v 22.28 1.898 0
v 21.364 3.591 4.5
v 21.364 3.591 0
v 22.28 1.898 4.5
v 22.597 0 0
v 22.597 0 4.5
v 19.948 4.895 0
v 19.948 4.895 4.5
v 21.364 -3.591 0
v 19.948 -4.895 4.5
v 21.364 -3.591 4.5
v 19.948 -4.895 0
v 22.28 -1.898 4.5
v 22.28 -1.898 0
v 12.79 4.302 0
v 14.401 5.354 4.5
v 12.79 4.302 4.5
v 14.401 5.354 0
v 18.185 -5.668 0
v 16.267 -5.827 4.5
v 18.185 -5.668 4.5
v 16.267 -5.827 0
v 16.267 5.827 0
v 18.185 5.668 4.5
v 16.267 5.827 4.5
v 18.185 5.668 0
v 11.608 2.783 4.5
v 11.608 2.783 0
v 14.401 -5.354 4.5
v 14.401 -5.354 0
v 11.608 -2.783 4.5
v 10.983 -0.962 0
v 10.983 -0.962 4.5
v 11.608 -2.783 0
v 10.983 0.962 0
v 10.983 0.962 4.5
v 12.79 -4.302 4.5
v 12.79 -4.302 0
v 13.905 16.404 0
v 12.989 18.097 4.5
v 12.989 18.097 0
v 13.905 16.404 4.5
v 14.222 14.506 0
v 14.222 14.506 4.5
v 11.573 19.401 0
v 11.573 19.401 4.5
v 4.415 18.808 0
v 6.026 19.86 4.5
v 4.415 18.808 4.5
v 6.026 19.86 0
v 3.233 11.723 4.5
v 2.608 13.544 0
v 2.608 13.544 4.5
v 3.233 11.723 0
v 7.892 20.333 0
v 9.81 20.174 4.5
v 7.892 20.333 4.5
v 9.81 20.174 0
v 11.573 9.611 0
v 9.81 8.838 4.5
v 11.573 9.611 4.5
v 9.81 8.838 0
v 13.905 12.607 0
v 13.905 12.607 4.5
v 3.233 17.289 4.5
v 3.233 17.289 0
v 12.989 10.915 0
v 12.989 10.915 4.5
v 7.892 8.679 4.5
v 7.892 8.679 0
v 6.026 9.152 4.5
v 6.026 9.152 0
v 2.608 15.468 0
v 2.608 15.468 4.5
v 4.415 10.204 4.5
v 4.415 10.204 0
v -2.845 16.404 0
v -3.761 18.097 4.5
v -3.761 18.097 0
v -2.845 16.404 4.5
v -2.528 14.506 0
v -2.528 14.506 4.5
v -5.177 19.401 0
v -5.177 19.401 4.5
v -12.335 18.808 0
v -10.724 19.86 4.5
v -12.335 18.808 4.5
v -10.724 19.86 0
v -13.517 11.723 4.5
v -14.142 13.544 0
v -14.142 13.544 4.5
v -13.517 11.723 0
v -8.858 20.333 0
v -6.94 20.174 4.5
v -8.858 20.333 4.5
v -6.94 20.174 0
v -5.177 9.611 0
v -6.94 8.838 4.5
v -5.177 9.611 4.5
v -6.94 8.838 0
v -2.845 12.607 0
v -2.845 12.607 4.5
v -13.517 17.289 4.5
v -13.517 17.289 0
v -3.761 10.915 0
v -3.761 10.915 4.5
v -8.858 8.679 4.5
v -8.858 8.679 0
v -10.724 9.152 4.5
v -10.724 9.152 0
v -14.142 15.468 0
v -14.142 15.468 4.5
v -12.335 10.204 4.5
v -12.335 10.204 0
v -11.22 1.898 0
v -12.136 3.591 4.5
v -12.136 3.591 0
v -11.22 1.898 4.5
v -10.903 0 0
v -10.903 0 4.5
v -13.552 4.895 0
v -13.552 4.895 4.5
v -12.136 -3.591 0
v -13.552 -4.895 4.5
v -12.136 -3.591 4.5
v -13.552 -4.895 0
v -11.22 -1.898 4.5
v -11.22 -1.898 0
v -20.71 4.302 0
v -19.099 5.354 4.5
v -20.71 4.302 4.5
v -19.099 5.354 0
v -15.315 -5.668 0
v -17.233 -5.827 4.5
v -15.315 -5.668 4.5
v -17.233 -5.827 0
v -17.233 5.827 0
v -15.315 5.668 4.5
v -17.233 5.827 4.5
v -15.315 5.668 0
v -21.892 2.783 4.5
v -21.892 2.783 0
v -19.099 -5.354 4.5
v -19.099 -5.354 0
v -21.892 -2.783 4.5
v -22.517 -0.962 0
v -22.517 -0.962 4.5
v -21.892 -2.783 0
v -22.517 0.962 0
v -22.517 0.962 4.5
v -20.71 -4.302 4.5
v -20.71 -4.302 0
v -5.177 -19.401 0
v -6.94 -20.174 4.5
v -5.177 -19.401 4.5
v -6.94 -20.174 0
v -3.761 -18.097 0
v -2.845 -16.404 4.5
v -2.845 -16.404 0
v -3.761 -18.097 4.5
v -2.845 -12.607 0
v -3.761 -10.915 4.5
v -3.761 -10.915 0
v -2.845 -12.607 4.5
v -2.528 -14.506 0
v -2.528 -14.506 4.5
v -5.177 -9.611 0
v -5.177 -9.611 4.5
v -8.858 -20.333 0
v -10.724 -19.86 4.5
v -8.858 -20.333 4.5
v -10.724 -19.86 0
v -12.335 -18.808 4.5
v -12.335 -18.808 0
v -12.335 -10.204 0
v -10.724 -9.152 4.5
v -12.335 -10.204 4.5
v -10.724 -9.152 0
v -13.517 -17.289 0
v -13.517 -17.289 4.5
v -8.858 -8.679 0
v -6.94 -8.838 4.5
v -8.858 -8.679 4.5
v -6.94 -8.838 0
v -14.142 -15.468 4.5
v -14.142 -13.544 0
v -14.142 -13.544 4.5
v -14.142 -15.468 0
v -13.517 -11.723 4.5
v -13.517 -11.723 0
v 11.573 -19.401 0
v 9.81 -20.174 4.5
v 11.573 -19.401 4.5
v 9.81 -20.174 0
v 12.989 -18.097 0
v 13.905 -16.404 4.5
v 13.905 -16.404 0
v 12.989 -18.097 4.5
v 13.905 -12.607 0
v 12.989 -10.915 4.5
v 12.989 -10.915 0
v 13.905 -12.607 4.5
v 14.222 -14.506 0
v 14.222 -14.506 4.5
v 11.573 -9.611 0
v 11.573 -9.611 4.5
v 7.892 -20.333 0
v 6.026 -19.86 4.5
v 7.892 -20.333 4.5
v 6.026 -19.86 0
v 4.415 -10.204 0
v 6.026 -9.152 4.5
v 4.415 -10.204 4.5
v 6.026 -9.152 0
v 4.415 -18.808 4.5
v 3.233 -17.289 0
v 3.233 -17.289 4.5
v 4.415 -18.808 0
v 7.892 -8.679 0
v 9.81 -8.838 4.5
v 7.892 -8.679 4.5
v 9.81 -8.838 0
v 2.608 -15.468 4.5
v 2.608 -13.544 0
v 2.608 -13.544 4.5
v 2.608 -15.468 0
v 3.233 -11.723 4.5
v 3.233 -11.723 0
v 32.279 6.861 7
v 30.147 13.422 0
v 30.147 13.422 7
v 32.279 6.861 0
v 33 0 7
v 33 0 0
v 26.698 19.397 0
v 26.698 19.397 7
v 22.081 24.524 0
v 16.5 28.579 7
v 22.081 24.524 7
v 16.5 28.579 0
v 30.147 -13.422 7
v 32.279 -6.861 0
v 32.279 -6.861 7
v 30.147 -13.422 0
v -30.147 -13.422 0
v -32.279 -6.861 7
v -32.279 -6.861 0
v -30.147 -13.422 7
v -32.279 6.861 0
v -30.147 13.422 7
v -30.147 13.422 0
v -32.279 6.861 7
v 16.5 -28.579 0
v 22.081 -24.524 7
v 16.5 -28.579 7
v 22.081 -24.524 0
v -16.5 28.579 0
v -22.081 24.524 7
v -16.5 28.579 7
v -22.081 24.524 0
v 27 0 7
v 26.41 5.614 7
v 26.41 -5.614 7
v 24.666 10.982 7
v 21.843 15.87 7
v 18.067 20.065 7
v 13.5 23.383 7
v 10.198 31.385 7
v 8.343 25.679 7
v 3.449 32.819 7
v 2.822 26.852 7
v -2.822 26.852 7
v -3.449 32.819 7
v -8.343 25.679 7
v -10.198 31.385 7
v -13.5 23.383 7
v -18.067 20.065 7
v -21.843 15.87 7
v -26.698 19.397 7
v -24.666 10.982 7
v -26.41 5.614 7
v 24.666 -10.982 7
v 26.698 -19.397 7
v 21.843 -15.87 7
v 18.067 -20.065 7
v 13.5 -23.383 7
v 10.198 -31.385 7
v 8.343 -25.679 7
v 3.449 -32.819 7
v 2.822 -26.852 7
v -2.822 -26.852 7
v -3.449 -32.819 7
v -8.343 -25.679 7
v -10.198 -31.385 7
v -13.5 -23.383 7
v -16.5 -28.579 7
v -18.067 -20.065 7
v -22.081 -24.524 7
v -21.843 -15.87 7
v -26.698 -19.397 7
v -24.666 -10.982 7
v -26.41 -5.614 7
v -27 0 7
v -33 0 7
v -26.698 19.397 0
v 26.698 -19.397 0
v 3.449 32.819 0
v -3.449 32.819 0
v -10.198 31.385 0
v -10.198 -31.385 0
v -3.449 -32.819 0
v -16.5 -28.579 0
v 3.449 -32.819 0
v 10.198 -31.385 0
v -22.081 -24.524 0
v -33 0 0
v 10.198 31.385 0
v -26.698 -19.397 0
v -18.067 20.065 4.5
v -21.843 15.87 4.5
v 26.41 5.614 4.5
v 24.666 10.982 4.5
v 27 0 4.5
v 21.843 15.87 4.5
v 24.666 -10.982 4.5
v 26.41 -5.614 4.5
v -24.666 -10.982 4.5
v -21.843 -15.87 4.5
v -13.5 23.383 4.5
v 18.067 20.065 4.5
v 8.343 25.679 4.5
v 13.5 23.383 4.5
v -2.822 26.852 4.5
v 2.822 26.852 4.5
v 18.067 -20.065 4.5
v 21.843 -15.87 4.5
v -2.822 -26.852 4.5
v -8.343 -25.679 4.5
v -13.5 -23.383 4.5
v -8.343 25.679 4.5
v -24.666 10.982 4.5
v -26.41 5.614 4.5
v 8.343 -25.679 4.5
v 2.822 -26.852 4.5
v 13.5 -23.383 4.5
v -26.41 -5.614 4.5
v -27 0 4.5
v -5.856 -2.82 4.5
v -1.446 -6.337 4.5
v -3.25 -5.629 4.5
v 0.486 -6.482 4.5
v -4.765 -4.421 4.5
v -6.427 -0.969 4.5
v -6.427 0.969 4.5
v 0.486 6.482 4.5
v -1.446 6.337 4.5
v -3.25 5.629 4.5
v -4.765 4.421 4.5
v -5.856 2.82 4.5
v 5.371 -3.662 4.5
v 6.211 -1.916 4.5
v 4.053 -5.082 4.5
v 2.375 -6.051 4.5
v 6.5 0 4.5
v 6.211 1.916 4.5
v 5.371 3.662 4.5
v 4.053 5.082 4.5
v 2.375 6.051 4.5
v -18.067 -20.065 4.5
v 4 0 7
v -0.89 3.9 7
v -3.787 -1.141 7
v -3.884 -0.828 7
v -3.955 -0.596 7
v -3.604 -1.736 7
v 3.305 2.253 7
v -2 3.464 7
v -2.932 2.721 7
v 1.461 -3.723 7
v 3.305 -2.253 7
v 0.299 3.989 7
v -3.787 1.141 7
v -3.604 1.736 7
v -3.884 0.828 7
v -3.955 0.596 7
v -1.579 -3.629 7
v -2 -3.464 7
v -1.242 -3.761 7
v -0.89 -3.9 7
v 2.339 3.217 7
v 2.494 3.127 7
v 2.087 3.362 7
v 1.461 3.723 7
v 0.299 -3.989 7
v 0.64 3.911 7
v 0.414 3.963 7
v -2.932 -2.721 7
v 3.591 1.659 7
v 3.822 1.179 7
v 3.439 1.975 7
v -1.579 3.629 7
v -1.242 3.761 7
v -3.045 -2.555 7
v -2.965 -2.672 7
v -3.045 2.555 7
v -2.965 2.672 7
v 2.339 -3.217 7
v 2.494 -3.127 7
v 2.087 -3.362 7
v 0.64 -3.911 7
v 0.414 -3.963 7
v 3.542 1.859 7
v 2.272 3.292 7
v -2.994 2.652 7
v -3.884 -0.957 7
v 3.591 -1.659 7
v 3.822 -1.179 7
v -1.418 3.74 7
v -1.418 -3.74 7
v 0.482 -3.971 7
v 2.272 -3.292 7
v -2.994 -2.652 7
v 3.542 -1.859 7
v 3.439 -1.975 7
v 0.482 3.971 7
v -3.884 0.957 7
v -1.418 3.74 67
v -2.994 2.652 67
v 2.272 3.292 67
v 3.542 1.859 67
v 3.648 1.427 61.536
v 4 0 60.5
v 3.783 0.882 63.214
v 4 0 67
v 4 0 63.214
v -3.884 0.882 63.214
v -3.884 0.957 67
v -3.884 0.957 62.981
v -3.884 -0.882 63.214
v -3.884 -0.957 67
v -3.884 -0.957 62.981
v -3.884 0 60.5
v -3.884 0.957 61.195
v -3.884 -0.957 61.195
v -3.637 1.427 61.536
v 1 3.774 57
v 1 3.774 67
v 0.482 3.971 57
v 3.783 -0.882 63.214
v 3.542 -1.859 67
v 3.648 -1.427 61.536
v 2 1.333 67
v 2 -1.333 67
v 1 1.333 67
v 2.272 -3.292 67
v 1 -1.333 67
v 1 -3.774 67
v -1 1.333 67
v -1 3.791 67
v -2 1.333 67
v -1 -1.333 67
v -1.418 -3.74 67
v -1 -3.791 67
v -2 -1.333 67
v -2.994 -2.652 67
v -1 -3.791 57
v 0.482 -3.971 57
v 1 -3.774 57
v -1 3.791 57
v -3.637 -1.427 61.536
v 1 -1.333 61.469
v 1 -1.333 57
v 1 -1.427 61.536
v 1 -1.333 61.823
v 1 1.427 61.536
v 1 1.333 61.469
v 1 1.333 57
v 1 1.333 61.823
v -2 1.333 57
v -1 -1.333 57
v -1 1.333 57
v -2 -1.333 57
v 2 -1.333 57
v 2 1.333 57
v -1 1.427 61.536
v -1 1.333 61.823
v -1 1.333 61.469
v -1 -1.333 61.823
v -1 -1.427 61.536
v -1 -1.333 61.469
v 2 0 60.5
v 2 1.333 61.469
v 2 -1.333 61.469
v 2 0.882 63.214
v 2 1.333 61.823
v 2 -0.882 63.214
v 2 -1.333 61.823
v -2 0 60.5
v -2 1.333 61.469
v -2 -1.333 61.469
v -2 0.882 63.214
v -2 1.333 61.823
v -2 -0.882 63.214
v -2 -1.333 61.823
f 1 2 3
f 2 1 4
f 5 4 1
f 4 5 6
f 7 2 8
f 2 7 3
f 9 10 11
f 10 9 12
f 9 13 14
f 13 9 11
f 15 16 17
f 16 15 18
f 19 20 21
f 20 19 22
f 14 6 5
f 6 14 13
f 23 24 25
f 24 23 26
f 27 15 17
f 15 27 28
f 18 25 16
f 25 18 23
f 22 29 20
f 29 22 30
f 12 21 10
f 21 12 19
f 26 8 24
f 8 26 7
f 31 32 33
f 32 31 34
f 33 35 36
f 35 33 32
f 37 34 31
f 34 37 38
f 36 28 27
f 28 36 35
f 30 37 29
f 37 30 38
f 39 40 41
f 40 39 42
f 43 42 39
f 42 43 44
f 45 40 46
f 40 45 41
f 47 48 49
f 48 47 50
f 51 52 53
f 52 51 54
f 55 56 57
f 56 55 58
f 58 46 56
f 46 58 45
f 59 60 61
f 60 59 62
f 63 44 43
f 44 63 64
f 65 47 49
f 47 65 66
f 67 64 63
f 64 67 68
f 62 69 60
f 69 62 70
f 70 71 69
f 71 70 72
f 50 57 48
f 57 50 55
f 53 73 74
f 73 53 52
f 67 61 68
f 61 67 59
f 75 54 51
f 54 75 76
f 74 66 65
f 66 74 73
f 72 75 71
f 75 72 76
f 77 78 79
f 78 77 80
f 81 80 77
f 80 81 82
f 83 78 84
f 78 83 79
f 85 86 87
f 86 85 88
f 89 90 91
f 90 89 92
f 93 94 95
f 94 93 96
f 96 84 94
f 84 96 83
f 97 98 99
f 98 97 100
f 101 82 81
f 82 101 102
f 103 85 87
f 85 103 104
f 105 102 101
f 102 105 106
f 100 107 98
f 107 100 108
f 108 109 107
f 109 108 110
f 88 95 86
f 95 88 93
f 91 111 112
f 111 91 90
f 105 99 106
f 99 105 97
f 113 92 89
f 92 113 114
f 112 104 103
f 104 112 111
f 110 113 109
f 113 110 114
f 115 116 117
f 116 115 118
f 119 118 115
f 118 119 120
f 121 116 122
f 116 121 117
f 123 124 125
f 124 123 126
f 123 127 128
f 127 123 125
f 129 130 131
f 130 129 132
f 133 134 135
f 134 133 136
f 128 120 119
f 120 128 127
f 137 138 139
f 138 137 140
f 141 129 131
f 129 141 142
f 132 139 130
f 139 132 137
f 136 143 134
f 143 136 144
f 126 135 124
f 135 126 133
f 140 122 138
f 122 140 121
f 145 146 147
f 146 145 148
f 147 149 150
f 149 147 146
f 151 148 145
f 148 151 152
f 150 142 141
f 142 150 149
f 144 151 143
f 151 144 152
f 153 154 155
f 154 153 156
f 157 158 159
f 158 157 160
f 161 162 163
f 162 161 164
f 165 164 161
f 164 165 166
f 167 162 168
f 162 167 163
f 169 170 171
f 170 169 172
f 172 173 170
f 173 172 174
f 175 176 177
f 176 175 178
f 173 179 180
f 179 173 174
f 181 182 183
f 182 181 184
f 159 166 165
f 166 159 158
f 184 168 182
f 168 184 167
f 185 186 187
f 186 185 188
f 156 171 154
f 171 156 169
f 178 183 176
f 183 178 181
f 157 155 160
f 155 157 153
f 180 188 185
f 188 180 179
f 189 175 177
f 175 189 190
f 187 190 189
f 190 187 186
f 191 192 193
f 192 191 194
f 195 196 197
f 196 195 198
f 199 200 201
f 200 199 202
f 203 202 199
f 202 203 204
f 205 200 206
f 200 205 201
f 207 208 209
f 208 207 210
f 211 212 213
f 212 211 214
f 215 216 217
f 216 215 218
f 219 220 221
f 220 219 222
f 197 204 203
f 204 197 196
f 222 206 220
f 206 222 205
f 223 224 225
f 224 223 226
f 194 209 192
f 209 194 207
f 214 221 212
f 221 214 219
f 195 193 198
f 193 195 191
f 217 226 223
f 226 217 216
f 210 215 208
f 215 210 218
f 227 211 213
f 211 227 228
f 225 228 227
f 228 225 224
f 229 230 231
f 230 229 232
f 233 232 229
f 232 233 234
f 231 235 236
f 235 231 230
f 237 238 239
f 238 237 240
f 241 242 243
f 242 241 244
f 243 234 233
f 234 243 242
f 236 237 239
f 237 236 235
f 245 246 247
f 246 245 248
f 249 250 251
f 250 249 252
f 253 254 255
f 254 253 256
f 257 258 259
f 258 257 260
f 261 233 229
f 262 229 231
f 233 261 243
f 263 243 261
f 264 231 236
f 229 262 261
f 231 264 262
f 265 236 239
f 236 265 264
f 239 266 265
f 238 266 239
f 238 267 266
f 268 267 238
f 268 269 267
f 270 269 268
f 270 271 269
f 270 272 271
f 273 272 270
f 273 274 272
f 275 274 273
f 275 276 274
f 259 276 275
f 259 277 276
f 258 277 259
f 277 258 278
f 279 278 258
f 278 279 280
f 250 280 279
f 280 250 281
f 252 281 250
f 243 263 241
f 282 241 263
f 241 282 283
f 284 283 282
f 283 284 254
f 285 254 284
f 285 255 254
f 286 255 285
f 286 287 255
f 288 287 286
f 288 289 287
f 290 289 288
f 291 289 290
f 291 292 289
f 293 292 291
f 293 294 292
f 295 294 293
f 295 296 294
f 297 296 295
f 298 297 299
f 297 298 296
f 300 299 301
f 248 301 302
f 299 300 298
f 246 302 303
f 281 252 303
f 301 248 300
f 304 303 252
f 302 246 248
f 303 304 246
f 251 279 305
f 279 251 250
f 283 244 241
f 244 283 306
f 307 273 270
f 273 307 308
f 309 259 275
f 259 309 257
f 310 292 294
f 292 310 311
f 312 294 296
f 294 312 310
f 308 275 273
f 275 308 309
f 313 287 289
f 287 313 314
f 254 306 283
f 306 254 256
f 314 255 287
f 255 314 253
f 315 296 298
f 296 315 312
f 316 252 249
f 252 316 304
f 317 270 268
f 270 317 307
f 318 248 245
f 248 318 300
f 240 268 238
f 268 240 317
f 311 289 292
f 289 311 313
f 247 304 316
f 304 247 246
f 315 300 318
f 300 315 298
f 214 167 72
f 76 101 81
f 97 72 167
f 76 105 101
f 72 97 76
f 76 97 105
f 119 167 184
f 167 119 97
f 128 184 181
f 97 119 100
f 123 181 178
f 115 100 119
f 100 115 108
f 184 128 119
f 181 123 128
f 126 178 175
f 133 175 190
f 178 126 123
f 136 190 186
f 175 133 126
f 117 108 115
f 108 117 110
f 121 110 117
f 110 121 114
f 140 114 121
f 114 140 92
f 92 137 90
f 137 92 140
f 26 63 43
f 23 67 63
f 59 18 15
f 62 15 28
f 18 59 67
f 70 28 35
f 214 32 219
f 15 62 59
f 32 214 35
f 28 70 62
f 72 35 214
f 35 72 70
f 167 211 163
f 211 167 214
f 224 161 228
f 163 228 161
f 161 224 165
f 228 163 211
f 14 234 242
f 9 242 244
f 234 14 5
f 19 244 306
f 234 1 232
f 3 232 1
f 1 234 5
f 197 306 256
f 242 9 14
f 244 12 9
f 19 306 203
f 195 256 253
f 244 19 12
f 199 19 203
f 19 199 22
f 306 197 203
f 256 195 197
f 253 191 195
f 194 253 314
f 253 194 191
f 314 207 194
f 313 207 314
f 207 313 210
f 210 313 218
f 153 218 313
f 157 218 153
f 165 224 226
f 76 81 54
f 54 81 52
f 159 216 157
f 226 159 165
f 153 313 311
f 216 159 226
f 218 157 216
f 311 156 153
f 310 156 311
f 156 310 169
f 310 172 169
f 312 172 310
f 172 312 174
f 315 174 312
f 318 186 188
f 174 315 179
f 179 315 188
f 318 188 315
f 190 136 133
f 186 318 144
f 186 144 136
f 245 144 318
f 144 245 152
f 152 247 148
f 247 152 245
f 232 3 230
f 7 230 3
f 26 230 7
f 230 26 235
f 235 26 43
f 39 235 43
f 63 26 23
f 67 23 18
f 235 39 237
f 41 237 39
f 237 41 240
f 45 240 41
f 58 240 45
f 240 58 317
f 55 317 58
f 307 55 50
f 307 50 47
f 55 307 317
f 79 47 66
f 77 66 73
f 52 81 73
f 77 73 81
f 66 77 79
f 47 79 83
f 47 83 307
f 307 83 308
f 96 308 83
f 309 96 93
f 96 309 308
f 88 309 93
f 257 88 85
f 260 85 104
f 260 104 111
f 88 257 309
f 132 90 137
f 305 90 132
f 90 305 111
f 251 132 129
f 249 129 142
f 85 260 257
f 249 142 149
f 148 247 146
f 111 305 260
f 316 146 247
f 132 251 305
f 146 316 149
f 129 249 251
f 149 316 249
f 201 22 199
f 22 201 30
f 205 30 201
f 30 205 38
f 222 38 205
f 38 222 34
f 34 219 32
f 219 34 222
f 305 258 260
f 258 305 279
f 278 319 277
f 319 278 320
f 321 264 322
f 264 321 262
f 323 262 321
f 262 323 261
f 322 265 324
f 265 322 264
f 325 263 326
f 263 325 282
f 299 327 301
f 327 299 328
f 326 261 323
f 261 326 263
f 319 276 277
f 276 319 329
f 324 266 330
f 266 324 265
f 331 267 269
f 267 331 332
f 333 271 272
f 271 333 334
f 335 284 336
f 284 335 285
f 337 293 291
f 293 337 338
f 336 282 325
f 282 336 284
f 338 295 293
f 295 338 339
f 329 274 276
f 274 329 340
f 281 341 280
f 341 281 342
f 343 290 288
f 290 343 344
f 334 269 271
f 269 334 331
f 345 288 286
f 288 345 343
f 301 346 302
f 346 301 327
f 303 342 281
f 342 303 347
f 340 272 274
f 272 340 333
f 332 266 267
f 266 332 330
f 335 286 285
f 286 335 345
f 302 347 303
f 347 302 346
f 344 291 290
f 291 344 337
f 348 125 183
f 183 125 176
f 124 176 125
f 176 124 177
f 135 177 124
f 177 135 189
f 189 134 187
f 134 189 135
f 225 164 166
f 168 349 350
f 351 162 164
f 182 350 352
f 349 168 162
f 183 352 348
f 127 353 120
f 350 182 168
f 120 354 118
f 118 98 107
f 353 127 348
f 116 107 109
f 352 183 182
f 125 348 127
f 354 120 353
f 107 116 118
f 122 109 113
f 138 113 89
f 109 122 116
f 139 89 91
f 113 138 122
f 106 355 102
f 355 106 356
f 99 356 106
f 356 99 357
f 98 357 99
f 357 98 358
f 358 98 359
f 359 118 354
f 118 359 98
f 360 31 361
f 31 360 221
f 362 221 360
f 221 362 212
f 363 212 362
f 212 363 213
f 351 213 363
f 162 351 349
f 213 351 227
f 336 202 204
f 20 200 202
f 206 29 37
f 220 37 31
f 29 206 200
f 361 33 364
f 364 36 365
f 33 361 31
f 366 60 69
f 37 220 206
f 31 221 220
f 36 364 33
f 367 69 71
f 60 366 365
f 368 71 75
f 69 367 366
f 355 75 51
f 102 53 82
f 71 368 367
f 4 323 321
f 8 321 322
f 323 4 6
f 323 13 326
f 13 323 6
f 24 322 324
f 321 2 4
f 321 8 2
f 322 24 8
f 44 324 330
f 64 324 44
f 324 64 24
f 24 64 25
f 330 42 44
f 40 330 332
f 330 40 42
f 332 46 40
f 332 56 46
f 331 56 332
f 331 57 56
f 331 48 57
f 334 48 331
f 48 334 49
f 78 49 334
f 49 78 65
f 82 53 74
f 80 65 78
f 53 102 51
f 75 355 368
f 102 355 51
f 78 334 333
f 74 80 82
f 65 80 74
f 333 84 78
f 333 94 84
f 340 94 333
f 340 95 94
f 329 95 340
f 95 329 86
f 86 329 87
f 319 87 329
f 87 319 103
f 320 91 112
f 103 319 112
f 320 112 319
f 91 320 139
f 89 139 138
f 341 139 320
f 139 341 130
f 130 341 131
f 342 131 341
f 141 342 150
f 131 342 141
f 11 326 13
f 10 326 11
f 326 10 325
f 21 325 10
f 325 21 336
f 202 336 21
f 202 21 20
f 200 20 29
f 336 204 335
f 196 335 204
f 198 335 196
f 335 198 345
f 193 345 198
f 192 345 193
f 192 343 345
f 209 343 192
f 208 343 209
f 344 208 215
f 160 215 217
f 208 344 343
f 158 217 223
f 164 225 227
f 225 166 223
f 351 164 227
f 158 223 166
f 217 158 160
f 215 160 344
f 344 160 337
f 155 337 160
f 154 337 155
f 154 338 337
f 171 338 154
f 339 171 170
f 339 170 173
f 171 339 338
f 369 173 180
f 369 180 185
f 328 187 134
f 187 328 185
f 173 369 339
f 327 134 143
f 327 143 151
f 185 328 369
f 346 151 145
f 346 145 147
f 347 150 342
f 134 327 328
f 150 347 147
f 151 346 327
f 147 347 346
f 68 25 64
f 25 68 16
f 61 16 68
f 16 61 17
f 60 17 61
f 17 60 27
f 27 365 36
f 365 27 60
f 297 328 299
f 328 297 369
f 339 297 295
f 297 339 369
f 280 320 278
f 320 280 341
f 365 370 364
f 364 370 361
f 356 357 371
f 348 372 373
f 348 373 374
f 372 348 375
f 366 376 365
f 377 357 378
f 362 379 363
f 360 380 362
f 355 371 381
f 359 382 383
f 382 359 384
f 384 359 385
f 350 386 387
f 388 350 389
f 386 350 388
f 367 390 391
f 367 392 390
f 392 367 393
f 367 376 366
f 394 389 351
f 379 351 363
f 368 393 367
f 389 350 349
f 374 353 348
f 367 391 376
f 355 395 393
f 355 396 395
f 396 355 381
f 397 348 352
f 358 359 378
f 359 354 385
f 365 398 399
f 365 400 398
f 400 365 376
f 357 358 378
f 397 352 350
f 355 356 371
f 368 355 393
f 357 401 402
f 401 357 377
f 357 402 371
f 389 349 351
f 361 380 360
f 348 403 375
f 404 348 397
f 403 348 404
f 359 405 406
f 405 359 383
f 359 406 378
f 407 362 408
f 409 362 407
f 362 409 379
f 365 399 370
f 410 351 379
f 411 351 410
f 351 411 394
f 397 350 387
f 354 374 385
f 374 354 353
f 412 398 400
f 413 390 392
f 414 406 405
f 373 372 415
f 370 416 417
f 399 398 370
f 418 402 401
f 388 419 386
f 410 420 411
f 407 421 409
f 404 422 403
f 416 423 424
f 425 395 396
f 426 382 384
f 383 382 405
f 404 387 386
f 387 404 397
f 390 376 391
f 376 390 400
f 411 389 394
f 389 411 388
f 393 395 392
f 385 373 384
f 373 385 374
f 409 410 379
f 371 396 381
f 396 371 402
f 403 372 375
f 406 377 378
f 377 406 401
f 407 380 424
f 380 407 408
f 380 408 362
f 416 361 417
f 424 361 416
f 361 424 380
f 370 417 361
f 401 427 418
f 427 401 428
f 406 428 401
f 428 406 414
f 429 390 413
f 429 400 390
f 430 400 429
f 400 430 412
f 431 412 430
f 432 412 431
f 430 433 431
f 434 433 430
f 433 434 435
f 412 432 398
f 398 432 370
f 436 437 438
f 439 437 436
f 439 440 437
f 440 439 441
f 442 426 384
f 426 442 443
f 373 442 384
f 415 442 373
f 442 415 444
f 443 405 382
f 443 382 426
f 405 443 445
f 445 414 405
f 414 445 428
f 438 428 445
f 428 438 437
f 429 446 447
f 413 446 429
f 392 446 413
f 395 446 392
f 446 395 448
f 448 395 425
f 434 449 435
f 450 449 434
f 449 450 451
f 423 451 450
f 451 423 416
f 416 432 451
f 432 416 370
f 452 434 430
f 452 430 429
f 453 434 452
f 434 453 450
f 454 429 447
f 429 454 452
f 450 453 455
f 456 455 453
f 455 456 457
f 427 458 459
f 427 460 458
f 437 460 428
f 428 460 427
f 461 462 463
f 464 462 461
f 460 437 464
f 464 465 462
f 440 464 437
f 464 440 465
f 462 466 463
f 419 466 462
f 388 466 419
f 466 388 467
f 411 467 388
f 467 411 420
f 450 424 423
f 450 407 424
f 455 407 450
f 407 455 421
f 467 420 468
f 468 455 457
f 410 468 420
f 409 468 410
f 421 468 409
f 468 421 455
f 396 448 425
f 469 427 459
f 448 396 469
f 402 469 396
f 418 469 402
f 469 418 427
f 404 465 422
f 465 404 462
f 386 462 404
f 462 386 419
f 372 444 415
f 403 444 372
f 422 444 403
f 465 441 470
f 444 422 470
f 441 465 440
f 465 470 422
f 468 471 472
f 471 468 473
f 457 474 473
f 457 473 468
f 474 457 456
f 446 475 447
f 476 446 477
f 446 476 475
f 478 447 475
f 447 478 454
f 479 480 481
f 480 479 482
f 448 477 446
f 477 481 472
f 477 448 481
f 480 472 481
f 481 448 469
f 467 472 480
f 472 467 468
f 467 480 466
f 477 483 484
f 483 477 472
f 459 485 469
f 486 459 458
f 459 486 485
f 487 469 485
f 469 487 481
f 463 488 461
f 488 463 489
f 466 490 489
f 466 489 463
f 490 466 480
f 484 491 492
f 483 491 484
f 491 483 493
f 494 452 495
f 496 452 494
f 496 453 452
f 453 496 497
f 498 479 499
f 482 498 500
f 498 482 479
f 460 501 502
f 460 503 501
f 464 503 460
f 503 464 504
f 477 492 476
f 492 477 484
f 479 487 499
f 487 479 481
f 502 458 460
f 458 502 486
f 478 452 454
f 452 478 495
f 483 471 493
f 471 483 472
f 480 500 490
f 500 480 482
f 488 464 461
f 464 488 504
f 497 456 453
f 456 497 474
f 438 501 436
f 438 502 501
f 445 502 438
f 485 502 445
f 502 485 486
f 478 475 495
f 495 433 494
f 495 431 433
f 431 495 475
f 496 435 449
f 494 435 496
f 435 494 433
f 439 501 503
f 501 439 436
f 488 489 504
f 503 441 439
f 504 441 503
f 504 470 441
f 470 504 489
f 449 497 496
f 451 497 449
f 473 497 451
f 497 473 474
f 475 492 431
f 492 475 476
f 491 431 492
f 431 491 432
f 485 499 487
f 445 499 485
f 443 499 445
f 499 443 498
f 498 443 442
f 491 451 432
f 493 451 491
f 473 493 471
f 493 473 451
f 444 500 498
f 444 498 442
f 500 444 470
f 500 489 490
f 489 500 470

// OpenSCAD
// file: wheel_axle.scad
/* sinusoid-plotter: A parametric sinusoid plotter made with OpenSCAD.
 * Copyright (C) 2013  Clayton G. Hobbs
 * 
 * This program is free software: you can redistribute it and/or modify
 * it under the terms of the GNU General Public License as published by
 * the Free Software Foundation, either version 3 of the License, or
 * (at your option) any later version.
 * 
 * This program is distributed in the hope that it will be useful,
 * but WITHOUT ANY WARRANTY; without even the implied warranty of
 * MERCHANTABILITY or FITNESS FOR A PARTICULAR PURPOSE.  See the
 * GNU General Public License for more details.
 * 
 * You should have received a copy of the GNU General Public License
 * along with this program.  If not, see <http://www.gnu.org/licenses/>.
 */

include <constants.scad>;

module wheel_axle(radius, height, rim_thickness, rim_height, axle_radius,
                   axle_length, holes=6, hole_radius_factor=4/3) {
	middle_radius = (radius - rim_thickness + axle_radius + rim_height)/2;
	hole_radius = hole_radius_factor*pi*middle_radius/(holes*2);

	difference() {
		// Wheel body
		cylinder(r = radius, h = height);

		// Cutout on axle side to save plastic
		translate([0, 0, height - rim_height])
		cylinder(r = radius - rim_thickness, h = height);

		// Holes through the wheel to save plastic
		for(x = [0:holes-1]) {
			translate([cos(360*x/holes)*middle_radius,
                       sin(360*x/holes)*middle_radius, -.5])
			cylinder(r = hole_radius, h = height + 1);
		}
	}

	// Axle flange
	translate([0, 0, height - rim_height])
	cylinder(r1 = axle_radius + rim_height, r2 = axle_radius,
             h = rim_height);

	// Axle shaft
	translate([0, 0, height])
	cylinder(r = axle_radius, h = axle_length);
}

wheel_axle(radius = 33, height = 7, rim_thickness = 6, rim_height = 2.5,
            axle_radius = 4, axle_length = 55);

// vim: ts=4 sw=4 noet
// file: constants.scad
/* sinusoid-plotter: A parametric sinusoid plotter made with OpenSCAD.
 * Copyright (C) 2013  Clayton G. Hobbs
 * 
 * This program is free software: you can redistribute it and/or modify
 * it under the terms of the GNU General Public License as published by
 * the Free Software Foundation, either version 3 of the License, or
 * (at your option) any later version.
 * 
 * This program is distributed in the hope that it will be useful,
 * but WITHOUT ANY WARRANTY; without even the implied warranty of
 * MERCHANTABILITY or FITNESS FOR A PARTICULAR PURPOSE.  See the
 * GNU General Public License for more details.
 * 
 * You should have received a copy of the GNU General Public License
 * along with this program.  If not, see <http://www.gnu.org/licenses/>.
 */

pi = 3.1415926535897932384626433832795;
// main file
/* sinusoid-plotter: A parametric sinusoid plotter made with OpenSCAD.
 * Copyright (C) 2013  Clayton G. Hobbs
 * 
 * This program is free software: you can redistribute it and/or modify
 * it under the terms of the GNU General Public License as published by
 * the Free Software Foundation, either version 3 of the License, or
 * (at your option) any later version.
 * 
 * This program is distributed in the hope that it will be useful,
 * but WITHOUT ANY WARRANTY; without even the implied warranty of
 * MERCHANTABILITY or FITNESS FOR A PARTICULAR PURPOSE.  See the
 * GNU General Public License for more details.
 * 
 * You should have received a copy of the GNU General Public License
 * along with this program.  If not, see <http://www.gnu.org/licenses/>.
 */

include <constants.scad>;
use <wheel_axle.scad>;

module female_wheel(radius, height, rim_thickness, rim_height, axle_radius,
                    axle_length, coupler_length, holes=6,
                    hole_radius_factor=4/3) {
	difference() {
		wheel_axle(radius=radius, height=height, rim_thickness=rim_thickness,
		           rim_height=rim_height, axle_radius=axle_radius,
		           axle_length=axle_length+coupler_length, holes=holes,
		           hole_radius_factor=hole_radius_factor);

		// Cut out the coupler shape
		translate([-axle_radius/4, -axle_radius, height + axle_length])
		cube([axle_radius/2, axle_radius*2, coupler_length + 1]);
		translate([-axle_radius/2, -axle_radius/3, height + axle_length])
		cube([axle_radius, 2*axle_radius/3, coupler_length + 1]);

		// Cut out the screw hole
		translate([0, 0, height + axle_length + coupler_length/2])
		rotate([0, 90, 0])
		cylinder(r = 1.5, h = axle_radius*2, center = true);
	}
}

female_wheel(radius = 33, height = 7, rim_thickness = 6, rim_height = 2.5,
           axle_radius = 4, axle_length = 50, coupler_length = 10);
		
// vim: ts=4 sw=4 noet
